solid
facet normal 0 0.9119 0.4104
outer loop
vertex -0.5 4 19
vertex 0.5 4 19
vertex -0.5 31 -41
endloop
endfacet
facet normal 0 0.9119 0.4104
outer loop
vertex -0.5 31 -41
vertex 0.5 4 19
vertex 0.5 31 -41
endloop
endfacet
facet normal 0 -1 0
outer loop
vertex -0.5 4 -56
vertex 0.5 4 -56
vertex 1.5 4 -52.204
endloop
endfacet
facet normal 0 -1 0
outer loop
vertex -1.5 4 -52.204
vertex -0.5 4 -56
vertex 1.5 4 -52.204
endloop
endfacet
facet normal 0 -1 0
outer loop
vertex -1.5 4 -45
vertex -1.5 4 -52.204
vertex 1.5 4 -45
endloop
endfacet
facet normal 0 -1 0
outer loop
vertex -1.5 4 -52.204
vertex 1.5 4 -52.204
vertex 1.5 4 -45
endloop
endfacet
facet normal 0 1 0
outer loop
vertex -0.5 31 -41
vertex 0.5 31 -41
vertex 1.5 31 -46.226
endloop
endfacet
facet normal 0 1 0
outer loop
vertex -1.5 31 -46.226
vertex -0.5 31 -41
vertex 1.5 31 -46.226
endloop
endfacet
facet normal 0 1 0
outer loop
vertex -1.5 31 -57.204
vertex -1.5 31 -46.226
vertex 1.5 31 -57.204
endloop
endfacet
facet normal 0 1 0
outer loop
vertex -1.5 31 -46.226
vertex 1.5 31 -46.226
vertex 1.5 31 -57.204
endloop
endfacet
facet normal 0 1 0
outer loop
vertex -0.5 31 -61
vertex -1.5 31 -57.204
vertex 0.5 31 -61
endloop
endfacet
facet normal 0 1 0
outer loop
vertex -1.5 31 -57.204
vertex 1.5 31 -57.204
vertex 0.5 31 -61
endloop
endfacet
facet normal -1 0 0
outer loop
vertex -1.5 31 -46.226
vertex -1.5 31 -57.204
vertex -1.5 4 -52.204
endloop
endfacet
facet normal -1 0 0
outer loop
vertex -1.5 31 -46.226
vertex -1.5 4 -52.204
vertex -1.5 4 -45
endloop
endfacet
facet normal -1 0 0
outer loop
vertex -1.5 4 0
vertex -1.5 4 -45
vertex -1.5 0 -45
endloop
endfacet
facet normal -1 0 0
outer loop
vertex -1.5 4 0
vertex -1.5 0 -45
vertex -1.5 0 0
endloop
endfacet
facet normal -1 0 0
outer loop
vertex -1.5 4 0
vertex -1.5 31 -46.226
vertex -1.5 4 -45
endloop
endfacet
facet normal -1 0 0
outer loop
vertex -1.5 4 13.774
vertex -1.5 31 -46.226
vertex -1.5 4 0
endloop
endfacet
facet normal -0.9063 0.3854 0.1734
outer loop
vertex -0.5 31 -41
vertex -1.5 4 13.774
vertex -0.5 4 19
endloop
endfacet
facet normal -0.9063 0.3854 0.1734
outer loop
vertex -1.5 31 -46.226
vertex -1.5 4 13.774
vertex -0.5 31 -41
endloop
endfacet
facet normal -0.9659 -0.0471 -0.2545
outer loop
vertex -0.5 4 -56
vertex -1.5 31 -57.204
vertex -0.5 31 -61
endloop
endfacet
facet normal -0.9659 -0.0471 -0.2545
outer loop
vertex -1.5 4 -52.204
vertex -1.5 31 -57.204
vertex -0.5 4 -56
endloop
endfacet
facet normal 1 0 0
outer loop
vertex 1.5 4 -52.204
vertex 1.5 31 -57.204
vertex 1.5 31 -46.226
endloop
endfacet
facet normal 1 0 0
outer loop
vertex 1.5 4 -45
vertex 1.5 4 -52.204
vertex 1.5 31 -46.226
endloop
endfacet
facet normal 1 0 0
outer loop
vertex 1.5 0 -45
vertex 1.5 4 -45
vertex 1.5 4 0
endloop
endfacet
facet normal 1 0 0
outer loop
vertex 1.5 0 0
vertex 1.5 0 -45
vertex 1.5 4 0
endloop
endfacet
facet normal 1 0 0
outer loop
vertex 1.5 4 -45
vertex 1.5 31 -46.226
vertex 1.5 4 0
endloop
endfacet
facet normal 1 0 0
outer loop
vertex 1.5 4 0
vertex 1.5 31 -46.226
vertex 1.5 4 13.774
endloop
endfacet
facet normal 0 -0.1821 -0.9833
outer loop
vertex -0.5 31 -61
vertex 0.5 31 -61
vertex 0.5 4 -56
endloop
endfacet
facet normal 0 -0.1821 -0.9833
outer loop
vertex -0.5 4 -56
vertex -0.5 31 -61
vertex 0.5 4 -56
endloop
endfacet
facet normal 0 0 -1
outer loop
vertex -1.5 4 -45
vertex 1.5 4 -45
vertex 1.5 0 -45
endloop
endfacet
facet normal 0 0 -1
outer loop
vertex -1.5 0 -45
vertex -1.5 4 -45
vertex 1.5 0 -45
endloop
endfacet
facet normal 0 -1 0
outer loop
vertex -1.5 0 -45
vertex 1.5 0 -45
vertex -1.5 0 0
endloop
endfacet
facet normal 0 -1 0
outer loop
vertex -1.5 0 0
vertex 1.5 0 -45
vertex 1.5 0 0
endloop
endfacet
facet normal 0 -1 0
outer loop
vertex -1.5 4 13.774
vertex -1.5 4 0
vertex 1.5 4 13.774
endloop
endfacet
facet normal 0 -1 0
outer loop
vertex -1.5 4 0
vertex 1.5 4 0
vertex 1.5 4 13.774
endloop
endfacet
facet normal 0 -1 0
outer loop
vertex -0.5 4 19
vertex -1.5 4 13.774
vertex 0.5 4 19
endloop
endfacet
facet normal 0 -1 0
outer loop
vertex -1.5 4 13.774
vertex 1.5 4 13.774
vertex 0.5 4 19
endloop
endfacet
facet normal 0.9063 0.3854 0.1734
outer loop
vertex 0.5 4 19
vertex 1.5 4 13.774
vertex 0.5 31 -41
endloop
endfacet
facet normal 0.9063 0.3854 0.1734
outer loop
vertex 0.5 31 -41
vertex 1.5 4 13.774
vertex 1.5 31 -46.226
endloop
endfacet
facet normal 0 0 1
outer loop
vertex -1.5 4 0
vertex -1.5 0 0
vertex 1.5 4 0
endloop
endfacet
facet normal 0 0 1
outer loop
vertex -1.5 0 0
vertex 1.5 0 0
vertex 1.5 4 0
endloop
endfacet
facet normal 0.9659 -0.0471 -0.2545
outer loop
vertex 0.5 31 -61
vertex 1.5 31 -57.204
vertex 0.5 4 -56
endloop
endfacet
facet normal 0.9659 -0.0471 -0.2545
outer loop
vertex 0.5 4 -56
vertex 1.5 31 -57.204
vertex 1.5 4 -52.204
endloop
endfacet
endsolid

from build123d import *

# Parameters (mm, degrees)
BOSS_EXTRUDE1_DEPTH = 1.5
CHAMFER1_SIZE       = 1
CHAMFER1_SIZE2      = 3.732050808
CHAMFER2_SIZE       = 1
CHAMFER2_SIZE2      = 2.144506921


with BuildPart() as part:
    # Sketch1 → Boss-Extrude1 (new body, symmetric)
    with BuildSketch(Plane(origin=(0, 0, 0), x_dir=(0, 0, -1), z_dir=(1, 0, 0))):
        Polygon((45, 0), (0, 0), (0, 4), (-19, 4), (41, 31), (61, 31), (56, 4), (45, 4), align=None)
    extrude(amount=BOSS_EXTRUDE1_DEPTH, both=True)

    # Chamfer1
    chamfer1_edges = [part.edges().sort_by_distance(p)[0] for p in [
        (-1.5, 17.5, -58.5),
        (1.5, 17.5, -58.5),
    ]]
    chamfer1_side = [part.faces().sort_by_distance(p)[0] for p in [
        (0, 17.5, -58.5),
    ]]
    chamfer(chamfer1_edges, length=CHAMFER1_SIZE, length2=CHAMFER1_SIZE2, reference=chamfer1_side[0])

    # Chamfer2
    chamfer2_edges = [part.edges().sort_by_distance(p)[0] for p in [
        (-1.5, 17.5, -11),
        (1.5, 17.5, -11),
    ]]
    chamfer2_side = [part.faces().sort_by_distance(p)[0] for p in [
        (0, 17.5, -11),
    ]]
    chamfer(chamfer2_edges, length=CHAMFER2_SIZE, length2=CHAMFER2_SIZE2, reference=chamfer2_side[0])


solid = part.part
